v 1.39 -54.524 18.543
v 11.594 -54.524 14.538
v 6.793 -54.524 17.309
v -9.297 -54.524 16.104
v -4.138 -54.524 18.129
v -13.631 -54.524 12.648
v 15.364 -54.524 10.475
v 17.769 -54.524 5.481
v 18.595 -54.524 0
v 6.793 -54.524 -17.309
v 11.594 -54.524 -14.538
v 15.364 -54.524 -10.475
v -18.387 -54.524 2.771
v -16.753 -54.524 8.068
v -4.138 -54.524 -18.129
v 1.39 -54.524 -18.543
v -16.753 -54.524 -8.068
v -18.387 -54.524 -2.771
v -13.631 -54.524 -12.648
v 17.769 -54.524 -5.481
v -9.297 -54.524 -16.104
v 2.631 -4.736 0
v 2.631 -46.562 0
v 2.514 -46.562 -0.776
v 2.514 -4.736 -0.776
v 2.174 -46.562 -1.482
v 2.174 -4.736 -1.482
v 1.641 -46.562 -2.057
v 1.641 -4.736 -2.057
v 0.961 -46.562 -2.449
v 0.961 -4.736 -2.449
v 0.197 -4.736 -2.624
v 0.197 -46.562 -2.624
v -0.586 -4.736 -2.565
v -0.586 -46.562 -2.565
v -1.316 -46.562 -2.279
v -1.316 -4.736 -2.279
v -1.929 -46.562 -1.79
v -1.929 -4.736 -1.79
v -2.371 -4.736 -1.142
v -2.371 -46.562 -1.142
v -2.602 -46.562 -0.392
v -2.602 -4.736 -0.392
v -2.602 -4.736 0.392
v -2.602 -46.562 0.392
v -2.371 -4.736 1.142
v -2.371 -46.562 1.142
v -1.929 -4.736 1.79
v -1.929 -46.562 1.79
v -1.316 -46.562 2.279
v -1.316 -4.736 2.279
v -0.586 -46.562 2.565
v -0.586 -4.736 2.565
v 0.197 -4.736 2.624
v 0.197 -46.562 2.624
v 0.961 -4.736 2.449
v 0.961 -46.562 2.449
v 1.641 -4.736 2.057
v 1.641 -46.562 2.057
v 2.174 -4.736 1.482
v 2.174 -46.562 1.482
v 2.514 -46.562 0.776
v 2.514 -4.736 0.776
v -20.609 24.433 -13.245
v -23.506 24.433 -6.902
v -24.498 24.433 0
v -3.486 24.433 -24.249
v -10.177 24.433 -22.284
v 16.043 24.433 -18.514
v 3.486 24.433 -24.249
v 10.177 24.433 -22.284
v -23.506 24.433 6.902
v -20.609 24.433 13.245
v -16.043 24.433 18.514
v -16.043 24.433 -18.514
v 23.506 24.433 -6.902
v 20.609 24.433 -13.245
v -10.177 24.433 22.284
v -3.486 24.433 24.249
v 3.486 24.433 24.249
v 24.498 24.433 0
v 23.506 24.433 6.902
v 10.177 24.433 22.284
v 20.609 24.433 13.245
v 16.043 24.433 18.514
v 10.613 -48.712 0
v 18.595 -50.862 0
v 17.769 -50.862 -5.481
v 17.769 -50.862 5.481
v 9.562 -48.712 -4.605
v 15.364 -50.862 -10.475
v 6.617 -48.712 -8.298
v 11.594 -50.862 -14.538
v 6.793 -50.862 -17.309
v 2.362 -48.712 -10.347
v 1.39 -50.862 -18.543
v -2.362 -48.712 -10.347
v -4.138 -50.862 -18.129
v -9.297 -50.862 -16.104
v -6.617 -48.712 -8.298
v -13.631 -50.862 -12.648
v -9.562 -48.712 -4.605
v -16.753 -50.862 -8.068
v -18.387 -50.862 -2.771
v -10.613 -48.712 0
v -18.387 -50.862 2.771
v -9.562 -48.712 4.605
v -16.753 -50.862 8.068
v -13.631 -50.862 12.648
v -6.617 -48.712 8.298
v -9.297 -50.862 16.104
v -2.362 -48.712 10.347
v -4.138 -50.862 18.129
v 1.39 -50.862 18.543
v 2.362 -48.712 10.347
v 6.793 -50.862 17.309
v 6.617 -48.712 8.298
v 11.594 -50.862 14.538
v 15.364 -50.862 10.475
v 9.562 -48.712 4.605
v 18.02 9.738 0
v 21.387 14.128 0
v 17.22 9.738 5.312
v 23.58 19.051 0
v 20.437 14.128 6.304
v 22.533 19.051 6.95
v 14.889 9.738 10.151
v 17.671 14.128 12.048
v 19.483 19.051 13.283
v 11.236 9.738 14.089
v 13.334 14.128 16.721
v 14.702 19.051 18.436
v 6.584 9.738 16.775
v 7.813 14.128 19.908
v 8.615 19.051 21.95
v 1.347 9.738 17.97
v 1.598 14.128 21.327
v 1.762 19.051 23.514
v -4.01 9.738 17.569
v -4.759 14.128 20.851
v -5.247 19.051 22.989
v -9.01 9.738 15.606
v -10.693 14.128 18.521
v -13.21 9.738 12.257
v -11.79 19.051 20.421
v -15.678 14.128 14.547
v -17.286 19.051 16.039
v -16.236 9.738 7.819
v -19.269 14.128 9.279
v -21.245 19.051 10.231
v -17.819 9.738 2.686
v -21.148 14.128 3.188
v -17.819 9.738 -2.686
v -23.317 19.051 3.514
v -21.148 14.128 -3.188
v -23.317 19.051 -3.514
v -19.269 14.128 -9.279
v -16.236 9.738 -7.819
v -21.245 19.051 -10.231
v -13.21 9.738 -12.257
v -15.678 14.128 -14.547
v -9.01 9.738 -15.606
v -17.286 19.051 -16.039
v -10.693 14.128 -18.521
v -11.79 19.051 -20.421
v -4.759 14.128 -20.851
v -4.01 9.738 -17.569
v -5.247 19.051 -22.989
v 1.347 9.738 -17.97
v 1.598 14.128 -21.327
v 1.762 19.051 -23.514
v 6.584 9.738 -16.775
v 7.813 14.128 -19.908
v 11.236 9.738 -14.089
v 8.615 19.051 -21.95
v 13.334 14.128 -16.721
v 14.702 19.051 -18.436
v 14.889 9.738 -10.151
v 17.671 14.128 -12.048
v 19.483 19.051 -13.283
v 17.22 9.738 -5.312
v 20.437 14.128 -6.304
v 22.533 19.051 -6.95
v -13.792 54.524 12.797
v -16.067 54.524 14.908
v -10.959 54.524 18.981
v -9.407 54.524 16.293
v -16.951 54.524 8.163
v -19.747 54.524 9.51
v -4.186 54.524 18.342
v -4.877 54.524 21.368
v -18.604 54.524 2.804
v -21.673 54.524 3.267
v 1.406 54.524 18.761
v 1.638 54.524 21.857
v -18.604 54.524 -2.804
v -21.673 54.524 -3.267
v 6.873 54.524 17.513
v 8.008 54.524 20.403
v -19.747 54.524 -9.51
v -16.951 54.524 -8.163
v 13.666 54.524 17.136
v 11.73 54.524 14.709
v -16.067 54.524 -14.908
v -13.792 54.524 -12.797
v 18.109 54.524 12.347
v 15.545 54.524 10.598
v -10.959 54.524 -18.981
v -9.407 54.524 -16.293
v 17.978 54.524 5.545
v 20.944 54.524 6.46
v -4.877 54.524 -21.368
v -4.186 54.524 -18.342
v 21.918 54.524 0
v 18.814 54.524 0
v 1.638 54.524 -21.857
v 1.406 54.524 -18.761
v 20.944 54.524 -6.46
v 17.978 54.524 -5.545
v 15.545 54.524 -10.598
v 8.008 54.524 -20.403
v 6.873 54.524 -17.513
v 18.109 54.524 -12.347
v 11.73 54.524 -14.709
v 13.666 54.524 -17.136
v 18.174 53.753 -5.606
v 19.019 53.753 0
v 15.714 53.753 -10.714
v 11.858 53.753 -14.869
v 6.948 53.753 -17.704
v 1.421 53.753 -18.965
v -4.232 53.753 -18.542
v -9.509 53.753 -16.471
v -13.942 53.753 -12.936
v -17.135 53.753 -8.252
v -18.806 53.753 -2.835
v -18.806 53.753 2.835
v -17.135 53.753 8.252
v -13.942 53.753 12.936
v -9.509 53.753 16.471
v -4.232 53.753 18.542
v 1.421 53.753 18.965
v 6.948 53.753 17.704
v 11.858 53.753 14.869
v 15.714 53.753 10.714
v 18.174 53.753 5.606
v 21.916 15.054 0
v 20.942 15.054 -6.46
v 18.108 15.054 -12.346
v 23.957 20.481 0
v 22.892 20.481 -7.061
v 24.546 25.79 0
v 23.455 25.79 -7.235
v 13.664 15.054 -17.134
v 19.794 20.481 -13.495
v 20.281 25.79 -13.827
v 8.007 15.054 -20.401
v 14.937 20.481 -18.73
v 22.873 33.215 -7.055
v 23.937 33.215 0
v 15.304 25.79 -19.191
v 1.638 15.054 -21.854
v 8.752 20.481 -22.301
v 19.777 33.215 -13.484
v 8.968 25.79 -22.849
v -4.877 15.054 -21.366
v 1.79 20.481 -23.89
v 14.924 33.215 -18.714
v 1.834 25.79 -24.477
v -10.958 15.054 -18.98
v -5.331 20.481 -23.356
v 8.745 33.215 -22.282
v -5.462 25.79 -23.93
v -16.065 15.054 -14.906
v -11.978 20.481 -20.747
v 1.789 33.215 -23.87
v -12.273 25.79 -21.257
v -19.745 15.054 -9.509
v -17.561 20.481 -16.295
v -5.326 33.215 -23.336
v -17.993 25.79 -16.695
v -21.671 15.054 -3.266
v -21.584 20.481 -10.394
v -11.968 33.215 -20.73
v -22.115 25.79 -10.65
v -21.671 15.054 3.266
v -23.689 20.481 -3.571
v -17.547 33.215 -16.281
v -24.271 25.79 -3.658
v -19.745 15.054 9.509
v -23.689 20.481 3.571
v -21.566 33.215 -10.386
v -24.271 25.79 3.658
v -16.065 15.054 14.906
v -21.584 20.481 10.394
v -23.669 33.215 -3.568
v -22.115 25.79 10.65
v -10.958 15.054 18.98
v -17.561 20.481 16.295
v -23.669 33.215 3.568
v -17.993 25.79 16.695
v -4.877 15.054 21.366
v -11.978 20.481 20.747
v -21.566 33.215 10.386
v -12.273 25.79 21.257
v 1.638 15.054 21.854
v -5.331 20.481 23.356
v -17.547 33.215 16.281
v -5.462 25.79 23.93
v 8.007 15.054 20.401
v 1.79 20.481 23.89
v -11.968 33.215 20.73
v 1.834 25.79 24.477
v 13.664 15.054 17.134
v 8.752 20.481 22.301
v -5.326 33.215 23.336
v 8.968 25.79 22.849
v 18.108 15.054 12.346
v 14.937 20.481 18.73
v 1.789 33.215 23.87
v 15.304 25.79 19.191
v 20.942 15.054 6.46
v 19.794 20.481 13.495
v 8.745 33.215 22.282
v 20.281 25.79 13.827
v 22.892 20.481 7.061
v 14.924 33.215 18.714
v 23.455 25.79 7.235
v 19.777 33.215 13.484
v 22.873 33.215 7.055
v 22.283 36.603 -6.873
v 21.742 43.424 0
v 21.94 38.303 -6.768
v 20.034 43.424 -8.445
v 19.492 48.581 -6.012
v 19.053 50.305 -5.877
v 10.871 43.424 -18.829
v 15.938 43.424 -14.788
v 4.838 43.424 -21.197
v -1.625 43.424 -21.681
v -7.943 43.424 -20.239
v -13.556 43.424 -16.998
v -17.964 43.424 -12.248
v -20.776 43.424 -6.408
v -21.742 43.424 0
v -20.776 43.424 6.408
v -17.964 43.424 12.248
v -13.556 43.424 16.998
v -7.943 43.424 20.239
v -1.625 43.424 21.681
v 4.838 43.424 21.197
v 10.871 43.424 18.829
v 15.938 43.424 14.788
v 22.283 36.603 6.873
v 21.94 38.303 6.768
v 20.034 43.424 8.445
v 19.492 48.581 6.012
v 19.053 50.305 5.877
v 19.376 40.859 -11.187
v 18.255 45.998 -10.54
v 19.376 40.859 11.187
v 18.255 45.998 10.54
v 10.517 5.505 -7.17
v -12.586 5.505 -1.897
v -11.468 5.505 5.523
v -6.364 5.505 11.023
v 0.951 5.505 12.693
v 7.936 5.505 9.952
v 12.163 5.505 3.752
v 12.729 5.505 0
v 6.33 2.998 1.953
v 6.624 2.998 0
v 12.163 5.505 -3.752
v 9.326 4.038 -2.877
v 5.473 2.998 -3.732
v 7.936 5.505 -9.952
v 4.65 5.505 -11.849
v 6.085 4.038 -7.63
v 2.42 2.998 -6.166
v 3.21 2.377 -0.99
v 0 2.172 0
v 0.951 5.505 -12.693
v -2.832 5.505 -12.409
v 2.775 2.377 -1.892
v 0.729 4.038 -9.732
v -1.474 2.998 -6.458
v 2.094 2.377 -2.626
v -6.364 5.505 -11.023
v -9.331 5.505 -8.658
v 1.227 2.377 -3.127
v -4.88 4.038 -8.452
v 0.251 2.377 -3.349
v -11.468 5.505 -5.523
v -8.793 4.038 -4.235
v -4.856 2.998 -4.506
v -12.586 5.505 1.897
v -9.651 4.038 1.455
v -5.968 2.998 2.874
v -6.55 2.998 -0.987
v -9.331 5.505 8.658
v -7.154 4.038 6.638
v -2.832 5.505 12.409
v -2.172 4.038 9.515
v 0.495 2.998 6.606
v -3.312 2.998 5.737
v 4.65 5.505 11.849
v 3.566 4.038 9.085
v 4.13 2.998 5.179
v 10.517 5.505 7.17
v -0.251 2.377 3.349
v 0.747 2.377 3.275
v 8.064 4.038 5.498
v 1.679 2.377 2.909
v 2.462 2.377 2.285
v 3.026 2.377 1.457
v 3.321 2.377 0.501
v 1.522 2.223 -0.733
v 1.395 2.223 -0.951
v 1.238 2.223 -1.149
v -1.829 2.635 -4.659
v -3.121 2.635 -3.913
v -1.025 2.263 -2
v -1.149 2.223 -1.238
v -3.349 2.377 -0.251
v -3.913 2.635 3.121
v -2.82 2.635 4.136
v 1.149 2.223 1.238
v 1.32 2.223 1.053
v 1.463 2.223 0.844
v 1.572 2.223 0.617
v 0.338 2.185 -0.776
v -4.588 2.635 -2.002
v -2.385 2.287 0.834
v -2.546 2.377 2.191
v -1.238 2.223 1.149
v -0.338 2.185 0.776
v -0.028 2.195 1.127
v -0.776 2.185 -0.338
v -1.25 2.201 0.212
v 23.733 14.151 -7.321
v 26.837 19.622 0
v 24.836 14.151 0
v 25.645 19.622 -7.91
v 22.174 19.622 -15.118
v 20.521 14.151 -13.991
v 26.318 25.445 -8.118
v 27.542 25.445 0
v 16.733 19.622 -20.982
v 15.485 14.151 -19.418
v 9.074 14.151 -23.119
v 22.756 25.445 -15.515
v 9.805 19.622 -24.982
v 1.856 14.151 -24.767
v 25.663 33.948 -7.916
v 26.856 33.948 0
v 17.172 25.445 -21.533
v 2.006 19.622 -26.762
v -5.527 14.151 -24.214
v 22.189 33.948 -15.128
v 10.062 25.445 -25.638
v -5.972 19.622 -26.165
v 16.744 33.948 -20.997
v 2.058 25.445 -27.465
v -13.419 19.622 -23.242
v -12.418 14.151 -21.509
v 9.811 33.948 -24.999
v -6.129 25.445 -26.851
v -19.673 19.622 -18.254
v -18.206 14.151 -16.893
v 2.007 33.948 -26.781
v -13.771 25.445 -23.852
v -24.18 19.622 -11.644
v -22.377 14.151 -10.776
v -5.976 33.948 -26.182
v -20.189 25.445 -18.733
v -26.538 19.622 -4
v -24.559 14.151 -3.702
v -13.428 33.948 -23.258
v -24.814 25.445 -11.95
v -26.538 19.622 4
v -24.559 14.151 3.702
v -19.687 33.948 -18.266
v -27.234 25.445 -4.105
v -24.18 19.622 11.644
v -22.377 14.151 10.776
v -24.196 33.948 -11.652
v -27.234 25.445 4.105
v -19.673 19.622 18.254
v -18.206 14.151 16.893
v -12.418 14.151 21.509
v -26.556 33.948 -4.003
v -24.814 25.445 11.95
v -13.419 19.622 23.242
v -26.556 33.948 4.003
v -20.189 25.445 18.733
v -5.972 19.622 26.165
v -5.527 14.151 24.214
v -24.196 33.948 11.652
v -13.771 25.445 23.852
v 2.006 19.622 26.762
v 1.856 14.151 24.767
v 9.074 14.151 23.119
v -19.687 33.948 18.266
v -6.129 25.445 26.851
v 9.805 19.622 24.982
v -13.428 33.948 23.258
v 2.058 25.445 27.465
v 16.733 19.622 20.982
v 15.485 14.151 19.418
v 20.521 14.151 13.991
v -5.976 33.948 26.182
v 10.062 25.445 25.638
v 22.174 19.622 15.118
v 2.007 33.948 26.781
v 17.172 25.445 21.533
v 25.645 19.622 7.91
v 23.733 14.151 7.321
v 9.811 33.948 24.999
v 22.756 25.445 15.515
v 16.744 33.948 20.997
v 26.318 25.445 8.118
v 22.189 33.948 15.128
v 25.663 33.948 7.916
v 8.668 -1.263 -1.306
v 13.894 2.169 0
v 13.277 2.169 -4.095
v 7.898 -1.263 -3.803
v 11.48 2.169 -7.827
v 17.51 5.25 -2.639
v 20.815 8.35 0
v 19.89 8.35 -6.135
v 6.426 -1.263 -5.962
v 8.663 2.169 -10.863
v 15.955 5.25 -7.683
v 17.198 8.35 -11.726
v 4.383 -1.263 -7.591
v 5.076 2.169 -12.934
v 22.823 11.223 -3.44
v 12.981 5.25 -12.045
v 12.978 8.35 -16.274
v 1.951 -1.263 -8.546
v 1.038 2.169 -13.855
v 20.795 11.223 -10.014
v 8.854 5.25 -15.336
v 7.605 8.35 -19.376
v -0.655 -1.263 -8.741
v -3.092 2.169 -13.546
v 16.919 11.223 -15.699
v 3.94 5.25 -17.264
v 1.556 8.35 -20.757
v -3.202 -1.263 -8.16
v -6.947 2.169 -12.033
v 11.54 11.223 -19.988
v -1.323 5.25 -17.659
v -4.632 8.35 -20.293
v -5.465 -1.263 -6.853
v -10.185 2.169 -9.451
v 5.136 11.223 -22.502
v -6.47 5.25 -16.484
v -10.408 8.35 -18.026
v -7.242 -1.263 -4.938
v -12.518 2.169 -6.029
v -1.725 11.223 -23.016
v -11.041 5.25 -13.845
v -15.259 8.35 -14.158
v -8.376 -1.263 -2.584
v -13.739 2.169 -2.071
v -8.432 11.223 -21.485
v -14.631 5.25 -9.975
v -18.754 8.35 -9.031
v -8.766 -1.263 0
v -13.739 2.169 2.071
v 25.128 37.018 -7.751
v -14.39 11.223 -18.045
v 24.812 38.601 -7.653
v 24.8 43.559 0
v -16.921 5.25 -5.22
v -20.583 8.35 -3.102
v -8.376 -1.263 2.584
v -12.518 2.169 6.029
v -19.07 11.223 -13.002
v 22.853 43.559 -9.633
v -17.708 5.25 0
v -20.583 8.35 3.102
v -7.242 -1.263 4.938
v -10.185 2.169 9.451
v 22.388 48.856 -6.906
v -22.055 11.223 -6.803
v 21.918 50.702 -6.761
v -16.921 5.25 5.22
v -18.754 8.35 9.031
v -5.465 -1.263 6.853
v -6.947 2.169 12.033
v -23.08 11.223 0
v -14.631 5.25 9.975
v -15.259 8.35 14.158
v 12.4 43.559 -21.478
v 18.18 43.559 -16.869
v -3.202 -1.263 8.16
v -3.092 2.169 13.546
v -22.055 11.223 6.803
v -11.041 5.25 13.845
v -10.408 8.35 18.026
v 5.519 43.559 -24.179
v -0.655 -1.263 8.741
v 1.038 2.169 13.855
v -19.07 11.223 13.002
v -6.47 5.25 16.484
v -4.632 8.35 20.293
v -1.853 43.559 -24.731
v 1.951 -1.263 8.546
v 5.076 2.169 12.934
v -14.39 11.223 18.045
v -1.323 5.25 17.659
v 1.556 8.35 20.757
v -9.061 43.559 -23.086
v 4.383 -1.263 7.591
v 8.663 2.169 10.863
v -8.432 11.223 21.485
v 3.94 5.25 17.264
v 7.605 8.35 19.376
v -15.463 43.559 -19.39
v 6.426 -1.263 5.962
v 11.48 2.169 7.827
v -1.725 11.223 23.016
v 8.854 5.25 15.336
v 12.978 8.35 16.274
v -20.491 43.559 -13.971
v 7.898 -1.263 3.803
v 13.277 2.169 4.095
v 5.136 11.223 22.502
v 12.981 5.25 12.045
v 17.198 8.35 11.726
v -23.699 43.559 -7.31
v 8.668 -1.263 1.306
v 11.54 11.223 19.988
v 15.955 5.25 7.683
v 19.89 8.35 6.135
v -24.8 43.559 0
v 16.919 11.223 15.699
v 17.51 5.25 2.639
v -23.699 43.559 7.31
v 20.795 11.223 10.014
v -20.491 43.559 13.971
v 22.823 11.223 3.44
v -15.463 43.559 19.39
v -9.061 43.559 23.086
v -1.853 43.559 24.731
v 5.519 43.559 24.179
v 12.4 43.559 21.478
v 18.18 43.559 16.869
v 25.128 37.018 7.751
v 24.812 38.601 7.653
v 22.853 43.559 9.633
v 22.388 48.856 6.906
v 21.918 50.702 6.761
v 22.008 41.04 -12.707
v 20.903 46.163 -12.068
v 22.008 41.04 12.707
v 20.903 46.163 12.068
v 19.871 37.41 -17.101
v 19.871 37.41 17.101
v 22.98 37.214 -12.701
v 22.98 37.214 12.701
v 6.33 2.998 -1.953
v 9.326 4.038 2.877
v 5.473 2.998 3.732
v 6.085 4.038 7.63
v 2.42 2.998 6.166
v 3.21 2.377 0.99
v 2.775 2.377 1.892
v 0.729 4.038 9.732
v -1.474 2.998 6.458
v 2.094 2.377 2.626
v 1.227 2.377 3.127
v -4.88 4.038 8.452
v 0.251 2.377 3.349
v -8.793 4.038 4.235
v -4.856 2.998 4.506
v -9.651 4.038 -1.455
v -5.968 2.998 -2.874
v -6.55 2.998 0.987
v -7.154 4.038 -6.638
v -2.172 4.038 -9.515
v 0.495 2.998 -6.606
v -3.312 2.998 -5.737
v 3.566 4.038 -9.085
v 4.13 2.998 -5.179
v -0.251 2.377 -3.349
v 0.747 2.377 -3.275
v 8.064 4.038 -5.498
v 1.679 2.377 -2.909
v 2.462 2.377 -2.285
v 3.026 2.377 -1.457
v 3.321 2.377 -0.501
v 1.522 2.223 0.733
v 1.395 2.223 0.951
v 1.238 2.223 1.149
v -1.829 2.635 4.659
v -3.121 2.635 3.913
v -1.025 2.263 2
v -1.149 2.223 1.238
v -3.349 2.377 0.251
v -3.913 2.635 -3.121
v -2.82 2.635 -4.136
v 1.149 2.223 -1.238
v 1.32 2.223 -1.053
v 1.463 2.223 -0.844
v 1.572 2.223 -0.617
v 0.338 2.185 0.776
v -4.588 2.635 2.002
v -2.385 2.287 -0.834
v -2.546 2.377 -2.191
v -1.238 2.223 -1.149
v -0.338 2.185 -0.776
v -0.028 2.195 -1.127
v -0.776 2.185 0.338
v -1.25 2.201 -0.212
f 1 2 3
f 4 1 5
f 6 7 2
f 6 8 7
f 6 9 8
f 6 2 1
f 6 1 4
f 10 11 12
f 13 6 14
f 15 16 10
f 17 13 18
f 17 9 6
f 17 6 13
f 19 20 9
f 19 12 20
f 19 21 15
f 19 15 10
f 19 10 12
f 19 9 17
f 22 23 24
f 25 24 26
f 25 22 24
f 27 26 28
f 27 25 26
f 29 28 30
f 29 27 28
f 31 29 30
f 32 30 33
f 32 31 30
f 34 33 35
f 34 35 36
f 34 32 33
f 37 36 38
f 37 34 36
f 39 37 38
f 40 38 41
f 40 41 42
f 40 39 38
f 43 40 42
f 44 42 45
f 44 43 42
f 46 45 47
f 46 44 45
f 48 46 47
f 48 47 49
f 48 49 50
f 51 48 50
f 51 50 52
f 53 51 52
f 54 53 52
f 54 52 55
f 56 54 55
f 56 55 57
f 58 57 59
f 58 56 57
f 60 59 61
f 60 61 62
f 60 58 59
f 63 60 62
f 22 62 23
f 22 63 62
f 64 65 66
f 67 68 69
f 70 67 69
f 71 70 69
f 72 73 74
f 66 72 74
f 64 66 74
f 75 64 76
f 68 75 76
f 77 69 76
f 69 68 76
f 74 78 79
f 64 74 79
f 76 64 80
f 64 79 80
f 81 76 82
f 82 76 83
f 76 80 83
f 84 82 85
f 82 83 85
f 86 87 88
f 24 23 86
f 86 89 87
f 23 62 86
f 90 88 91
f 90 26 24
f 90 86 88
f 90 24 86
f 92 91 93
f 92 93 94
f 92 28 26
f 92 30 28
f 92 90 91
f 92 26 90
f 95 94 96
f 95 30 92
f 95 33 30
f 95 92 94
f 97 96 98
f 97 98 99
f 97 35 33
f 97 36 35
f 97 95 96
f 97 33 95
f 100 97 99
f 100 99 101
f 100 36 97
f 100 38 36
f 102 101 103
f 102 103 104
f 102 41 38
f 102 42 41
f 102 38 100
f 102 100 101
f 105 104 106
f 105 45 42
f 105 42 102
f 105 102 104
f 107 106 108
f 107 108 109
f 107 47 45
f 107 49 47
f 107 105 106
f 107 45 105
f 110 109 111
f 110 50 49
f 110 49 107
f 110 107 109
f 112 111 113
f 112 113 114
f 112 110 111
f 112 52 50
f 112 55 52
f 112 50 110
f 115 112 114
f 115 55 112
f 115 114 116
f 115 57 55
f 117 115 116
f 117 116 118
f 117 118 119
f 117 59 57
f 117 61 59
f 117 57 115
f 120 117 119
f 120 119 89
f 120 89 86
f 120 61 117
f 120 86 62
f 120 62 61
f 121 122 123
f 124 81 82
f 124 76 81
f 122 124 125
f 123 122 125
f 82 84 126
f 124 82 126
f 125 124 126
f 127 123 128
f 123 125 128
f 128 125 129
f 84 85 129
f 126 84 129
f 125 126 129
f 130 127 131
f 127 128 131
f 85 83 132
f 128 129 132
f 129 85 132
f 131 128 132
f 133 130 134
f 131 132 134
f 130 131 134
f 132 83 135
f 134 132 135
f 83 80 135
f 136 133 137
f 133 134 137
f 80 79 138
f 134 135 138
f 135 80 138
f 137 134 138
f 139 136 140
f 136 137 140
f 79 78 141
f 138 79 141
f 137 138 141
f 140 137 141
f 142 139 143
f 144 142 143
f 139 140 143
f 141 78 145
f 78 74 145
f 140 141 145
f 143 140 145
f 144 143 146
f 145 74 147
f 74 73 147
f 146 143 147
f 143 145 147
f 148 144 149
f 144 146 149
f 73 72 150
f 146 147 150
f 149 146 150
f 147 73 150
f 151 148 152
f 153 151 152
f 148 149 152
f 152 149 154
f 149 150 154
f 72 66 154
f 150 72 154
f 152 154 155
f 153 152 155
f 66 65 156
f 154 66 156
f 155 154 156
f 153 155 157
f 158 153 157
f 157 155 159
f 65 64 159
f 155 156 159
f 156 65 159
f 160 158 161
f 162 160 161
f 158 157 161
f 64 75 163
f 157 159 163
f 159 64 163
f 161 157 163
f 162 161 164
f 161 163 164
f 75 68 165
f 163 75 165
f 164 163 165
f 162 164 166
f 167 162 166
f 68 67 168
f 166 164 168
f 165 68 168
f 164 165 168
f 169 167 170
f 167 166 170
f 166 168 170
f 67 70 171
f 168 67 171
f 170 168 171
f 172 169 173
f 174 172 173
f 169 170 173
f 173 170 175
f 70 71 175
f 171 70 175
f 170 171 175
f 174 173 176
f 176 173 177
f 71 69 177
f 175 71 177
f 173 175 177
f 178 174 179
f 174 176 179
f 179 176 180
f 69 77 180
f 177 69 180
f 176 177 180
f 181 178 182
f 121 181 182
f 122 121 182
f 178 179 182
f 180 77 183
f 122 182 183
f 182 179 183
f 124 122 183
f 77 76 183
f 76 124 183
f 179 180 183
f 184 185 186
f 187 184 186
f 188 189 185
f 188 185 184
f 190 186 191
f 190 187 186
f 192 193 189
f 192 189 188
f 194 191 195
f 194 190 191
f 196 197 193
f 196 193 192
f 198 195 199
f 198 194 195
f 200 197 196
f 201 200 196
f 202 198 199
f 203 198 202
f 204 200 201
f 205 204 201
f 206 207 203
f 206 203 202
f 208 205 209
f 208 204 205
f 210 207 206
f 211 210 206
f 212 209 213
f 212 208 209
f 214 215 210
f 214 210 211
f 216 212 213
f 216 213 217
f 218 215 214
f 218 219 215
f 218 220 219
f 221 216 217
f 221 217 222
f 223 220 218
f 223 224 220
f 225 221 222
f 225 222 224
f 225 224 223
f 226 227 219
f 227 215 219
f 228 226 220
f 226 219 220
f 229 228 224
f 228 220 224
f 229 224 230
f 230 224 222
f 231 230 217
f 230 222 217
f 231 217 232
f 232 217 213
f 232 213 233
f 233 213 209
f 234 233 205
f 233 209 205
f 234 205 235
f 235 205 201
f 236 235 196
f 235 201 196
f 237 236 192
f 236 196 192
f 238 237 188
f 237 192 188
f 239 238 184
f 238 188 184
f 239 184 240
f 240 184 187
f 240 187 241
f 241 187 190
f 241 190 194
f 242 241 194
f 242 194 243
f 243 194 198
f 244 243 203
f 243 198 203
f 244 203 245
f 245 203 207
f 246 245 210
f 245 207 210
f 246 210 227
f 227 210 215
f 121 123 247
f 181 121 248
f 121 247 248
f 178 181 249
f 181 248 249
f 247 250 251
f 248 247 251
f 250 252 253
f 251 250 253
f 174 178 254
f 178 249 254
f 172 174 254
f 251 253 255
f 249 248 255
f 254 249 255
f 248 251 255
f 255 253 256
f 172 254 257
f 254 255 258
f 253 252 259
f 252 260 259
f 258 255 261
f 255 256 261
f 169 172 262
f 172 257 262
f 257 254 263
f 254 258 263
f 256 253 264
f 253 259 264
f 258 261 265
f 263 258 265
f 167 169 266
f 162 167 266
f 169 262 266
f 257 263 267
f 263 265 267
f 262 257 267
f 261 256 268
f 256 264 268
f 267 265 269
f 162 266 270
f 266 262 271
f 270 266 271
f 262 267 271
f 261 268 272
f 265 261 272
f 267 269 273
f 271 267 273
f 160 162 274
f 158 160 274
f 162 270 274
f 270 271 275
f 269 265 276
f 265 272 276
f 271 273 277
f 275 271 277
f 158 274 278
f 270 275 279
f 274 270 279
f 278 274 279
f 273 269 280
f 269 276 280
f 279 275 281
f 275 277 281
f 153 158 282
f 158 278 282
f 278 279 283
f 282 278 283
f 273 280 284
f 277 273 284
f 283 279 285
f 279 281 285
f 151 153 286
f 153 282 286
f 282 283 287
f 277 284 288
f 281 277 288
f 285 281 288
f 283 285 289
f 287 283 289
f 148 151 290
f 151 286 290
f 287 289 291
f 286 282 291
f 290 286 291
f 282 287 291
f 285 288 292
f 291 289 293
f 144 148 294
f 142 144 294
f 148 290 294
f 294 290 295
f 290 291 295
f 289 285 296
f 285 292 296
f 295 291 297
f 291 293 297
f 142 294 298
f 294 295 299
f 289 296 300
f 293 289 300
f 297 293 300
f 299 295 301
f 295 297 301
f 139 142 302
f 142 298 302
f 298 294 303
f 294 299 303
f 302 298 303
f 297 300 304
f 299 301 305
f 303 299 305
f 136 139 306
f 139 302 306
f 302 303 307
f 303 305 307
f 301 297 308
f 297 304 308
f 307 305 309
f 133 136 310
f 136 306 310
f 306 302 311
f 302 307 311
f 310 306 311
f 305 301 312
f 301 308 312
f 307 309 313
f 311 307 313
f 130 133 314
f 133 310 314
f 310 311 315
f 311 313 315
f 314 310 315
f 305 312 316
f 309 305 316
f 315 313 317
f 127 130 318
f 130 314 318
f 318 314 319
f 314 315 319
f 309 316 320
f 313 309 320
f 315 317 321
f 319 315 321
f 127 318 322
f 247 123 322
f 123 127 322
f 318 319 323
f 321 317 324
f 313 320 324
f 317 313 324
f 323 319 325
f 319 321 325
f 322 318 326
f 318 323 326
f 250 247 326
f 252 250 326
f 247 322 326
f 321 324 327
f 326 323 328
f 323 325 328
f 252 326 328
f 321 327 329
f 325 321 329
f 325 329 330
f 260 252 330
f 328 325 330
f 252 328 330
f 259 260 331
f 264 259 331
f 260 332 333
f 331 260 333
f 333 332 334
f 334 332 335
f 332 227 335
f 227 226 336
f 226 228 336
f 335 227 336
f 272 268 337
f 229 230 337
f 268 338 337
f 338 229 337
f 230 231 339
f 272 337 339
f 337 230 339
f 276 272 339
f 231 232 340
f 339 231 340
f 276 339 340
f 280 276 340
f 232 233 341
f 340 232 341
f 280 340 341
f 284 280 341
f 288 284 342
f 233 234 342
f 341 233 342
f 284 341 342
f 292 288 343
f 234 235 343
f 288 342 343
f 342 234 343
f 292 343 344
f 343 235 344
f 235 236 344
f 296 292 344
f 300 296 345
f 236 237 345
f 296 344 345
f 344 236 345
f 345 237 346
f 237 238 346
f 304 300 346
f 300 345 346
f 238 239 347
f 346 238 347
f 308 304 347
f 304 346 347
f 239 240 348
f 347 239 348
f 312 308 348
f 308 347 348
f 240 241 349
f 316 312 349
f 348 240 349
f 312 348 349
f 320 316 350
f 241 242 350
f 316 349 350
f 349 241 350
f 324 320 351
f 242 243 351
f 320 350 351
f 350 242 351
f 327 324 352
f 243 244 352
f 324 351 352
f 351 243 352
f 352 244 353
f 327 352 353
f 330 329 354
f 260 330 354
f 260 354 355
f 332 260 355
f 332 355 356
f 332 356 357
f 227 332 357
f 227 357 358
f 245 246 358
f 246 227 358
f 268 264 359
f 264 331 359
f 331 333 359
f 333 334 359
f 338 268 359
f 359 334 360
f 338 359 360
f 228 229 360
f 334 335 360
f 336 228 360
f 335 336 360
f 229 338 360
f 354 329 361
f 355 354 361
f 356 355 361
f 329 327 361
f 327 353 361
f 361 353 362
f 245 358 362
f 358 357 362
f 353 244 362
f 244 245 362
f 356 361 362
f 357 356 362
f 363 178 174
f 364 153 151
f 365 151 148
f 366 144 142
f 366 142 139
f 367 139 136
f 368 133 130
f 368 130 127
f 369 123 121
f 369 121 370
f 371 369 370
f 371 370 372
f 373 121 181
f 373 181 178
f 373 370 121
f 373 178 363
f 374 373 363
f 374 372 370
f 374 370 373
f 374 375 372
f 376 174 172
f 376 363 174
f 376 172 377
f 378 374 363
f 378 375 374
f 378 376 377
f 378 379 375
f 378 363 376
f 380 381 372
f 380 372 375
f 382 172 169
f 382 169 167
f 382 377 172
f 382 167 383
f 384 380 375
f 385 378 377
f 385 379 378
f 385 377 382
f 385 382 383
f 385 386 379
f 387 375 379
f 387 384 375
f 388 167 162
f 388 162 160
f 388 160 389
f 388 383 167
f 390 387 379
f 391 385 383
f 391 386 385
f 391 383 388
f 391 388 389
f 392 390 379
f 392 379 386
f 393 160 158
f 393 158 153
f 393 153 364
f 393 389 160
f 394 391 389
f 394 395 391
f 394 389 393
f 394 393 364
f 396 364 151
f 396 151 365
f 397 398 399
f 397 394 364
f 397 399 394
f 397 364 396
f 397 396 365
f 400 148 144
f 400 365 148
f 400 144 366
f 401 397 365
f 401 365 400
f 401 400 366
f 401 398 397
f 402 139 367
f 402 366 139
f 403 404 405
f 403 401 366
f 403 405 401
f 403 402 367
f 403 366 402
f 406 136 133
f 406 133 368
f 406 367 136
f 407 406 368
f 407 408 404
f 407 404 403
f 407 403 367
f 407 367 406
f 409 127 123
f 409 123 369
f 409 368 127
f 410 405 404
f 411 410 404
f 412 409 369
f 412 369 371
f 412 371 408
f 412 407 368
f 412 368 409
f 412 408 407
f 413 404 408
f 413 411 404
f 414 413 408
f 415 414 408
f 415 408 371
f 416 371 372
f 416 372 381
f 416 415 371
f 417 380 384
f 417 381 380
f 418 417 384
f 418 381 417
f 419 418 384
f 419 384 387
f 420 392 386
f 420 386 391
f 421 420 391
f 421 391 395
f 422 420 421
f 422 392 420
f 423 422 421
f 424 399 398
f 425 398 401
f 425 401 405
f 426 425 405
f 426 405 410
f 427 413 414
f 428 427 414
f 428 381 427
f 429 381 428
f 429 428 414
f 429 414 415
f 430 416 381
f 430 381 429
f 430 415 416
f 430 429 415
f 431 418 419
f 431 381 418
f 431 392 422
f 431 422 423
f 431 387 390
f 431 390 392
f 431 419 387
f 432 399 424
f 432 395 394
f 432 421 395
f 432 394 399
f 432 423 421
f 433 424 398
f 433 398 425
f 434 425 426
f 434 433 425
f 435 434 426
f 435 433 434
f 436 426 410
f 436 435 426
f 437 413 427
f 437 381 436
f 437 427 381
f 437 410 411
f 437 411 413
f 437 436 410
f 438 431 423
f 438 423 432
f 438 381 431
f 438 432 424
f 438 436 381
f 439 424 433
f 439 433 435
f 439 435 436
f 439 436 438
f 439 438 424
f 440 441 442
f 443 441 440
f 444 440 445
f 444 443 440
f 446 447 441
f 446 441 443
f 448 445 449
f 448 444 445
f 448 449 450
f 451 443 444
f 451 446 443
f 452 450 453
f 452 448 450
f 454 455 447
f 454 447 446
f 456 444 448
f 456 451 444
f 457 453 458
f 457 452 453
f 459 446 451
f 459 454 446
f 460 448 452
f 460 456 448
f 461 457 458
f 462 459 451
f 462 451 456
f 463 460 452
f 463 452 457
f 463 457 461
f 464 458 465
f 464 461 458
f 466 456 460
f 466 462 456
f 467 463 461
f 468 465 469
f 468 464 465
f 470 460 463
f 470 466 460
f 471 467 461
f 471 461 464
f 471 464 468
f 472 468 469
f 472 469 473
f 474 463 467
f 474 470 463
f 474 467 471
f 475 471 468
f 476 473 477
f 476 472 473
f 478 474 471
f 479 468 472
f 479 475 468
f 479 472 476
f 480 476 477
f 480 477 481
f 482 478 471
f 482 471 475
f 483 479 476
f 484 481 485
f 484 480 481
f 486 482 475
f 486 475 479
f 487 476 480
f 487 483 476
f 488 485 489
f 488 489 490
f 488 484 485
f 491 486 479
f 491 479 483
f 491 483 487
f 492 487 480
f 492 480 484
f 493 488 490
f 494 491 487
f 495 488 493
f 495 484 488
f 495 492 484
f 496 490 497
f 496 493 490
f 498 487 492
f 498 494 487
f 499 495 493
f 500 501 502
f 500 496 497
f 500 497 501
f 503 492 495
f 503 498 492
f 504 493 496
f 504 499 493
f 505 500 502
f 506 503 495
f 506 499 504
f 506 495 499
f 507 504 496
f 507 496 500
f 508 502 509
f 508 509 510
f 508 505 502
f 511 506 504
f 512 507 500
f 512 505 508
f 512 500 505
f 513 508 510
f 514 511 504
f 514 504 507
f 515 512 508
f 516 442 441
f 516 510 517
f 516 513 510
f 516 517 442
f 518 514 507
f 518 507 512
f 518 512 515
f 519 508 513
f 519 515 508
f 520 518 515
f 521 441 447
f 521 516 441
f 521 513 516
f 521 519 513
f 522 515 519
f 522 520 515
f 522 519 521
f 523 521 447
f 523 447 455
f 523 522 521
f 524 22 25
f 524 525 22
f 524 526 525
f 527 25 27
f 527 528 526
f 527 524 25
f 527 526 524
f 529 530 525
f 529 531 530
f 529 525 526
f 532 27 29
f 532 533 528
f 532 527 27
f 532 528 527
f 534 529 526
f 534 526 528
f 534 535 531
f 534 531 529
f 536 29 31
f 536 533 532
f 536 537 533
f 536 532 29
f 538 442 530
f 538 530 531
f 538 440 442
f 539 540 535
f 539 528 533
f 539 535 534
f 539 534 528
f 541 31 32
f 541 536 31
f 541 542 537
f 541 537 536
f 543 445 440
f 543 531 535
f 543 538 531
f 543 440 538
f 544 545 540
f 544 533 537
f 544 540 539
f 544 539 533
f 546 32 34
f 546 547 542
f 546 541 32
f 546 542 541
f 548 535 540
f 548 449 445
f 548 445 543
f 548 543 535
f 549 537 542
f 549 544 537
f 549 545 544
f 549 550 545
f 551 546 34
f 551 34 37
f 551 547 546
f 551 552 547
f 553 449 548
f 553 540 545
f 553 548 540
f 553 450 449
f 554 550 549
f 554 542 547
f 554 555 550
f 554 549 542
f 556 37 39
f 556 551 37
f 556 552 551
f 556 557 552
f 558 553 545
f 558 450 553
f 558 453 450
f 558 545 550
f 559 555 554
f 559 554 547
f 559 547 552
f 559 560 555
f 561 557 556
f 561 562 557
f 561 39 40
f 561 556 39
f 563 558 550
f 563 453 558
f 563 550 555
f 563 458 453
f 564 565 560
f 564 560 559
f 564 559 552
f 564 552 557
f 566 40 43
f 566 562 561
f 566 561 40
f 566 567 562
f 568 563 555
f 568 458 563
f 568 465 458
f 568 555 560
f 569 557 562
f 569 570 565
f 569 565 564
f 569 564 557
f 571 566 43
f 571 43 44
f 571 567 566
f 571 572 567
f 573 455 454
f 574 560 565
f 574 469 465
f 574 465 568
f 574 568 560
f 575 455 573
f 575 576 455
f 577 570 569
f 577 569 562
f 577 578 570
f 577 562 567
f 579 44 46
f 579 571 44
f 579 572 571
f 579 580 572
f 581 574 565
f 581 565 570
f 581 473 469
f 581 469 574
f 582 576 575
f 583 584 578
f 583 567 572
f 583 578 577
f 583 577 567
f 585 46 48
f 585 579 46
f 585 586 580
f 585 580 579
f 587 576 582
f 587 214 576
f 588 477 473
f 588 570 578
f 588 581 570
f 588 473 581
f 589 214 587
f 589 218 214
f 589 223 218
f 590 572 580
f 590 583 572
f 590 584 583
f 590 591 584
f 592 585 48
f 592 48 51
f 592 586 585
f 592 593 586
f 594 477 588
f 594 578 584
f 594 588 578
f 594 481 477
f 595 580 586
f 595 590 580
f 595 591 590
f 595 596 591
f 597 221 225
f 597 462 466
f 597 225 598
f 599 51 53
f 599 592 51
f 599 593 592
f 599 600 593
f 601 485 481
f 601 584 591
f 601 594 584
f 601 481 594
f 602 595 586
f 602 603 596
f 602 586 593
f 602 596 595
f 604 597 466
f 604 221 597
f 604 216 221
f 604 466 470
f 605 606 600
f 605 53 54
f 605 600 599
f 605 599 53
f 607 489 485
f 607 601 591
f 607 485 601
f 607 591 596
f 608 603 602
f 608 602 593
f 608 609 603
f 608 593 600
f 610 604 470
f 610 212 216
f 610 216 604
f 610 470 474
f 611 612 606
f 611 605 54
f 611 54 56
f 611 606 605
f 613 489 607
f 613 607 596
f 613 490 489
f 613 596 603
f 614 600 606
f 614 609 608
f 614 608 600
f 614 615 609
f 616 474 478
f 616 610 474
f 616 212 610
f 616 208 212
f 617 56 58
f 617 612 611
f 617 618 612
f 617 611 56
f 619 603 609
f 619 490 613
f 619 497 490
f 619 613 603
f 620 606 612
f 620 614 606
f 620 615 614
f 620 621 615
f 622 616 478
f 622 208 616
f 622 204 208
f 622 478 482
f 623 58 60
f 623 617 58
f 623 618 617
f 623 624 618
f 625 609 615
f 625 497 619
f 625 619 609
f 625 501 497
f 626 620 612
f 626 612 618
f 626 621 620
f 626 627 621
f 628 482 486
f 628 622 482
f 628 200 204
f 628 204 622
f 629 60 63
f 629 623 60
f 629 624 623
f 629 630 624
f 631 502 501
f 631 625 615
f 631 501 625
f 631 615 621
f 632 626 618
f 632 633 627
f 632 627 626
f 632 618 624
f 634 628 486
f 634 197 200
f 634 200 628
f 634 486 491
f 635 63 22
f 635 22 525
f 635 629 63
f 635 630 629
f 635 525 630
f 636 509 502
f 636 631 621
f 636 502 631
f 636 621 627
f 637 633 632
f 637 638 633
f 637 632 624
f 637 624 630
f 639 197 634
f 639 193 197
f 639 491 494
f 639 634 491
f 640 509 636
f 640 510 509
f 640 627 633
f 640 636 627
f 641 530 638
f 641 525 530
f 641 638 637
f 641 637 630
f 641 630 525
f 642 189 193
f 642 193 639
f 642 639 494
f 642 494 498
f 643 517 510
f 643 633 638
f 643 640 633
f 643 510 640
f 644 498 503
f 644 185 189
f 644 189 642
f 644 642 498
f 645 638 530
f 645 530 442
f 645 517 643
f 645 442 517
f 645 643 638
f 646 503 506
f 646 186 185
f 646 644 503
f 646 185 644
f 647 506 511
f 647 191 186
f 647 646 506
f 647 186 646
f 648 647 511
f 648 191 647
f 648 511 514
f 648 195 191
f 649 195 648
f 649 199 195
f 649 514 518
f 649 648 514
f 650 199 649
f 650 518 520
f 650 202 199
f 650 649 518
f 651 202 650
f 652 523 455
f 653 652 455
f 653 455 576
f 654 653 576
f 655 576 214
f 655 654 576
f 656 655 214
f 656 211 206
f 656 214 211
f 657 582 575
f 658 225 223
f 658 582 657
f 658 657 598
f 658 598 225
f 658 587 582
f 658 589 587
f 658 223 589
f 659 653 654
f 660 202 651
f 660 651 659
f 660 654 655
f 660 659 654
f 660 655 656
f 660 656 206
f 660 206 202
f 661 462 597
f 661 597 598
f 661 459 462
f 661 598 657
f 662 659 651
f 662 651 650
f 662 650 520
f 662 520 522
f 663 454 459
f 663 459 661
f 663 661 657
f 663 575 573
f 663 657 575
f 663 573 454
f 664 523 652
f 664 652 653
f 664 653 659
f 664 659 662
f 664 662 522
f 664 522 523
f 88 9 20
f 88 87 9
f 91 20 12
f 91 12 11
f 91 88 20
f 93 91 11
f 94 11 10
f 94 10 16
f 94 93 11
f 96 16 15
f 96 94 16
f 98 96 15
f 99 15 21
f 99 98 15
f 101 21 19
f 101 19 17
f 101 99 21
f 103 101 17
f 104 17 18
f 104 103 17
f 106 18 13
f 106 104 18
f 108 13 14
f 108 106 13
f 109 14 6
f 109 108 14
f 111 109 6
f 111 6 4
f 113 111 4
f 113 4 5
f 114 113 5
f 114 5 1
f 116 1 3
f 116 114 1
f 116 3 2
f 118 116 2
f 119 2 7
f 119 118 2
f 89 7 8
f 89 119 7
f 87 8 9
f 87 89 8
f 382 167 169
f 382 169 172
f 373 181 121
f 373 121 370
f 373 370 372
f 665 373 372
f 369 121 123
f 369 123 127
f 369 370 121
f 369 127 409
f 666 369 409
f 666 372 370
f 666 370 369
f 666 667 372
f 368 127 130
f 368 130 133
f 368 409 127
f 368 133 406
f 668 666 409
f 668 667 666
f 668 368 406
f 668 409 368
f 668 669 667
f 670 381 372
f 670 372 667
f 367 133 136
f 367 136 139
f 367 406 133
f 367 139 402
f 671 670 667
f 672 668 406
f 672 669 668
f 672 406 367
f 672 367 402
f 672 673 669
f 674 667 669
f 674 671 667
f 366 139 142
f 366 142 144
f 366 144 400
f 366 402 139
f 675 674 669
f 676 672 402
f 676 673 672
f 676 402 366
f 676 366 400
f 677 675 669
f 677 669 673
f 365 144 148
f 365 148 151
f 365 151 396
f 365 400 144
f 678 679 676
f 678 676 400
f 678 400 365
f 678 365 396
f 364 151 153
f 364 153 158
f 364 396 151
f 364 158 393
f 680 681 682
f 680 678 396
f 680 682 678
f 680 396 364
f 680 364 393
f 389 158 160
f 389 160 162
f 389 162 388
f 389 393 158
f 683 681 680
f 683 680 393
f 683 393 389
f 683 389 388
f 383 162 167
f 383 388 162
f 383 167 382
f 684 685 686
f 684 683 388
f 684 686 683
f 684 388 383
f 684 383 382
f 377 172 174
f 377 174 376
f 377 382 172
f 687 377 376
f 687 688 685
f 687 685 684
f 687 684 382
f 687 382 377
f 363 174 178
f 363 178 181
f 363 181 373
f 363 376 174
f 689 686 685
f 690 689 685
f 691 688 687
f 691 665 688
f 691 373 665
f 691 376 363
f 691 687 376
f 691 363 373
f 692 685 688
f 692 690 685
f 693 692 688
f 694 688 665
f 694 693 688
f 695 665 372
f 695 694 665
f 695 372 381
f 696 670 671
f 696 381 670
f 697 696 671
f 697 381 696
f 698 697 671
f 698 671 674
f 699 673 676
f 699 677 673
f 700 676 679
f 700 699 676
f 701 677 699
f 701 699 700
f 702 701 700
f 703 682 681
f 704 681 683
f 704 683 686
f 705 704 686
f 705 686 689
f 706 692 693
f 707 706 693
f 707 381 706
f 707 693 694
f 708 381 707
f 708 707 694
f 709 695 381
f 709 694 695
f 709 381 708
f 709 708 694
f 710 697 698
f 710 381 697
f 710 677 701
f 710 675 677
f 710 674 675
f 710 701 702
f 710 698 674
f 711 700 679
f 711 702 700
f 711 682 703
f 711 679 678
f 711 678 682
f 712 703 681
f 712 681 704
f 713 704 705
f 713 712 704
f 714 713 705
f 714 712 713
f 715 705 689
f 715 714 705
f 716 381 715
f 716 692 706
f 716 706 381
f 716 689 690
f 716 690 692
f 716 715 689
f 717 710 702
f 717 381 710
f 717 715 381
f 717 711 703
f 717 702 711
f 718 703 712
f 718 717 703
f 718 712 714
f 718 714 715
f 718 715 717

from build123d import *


# Read off the part's stored shape, not the designer's step: Cut-Revolve1
with BuildPart() as part:
    # Sketch2 → Revolve1 (revolve)
    with BuildSketch(Plane.XY):
        with BuildLine():
            Line((2.631253823, -46.562458286), (2.631253823, -4.736256881))
            add(Edge.make_bspline(
                [(2.631253823, -4.736256881), (34.471117499, 12.018970529), (29.443053516, 26.193716055), (21.917928882, 54.523597031)],
                knots=[0, 0, 0, 0, 1, 1, 1, 1], degree=3))
            Line((21.917928882, 54.523597031), (0, 54.523597031))
            Line((0, 54.523597031), (0, -54.523597031))
            Line((0, -54.523597031), (18.594871216, -54.523597031))
            Line((18.594871216, -54.523597031), (18.594871216, -50.861683976))
            Line((18.594871216, -50.861683976), (2.631253823, -46.562458286))
        make_face()
    revolve(axis=Axis((0, -54.523597031, 0), (0, 1, 0)))

    # Cut-Revolve1 outline → Cut-Revolve1 (revolve, cut)
    with BuildSketch(Plane.XY):
        with BuildLine():
            add(Edge.make_bspline(
                [(18.020471145, 9.738037596), (13.232269499, 4.62684716), (6.786495281, 2.171739839), (0, 2.171739839)],
                knots=[0.001429836, 0.001429836, 0.001429836, 0.001429836, 1, 1, 1, 1], degree=3))
            add(Edge.make_bspline(
                [(18.020471145, 9.738037596), (18.490068509, 10.239614321), (19.492455887, 11.381389394), (21.969134176, 14.711204078), (24.39185026, 20.213899803), (24.772115374, 28.28587885), (23.422813446, 36.692884797), (21.327912764, 45.171242003), (19.776816311, 50.899250576), (19.018524326, 53.75323788)],
                knots=[0.304443695, 0.304443695, 0.304443695, 0.304443695, 0.336156678, 0.375, 0.5, 0.625, 0.75, 0.875, 1, 1, 1, 1], degree=3))
            Line((19.018524326, 53.75323788), (18.813843258, 54.523597031))
            Line((18.813843258, 54.523597031), (0, 54.523597031))
            Line((0, 54.523597031), (0, 2.171739839))
        make_face()
    revolve(axis=Axis((0, 0, 0), (0, 1, 0)), mode=Mode.SUBTRACT)


with BuildPart() as body_2:
    # Sketch5 → Revolve2 (revolve)
    with BuildSketch(Plane.XY):
        with BuildLine():
            Line((24.49790326, 24.433071211), (0, 24.433071211))
            Line((0, 24.433071211), (0, 2.171739839))
            add(Edge.make_bspline(
                [(18.02047452, 9.738034434), (13.232271308, 4.626844539), (6.786495937, 2.171738373), (0, 2.171739839)],
                knots=[0, 0, 0, 0, 1, 1, 1, 1], degree=3))
            add(Edge.make_bspline(
                [(18.02047452, 9.738034434), (18.490068509, 10.239614321), (19.492455887, 11.381389394), (21.969134176, 14.711204078), (23.888170898, 19.069896885), (24.417216372, 23.045719749), (24.49790326, 24.433071211)],
                knots=[0, 0, 0, 0, 0.045593697, 0.101438668, 0.281150935, 0.374529239, 0.374529239, 0.374529239, 0.374529239], degree=3))
        make_face()
    revolve(axis=Axis((0, 24.433071211, 0), (0, -1, 0)))


solid = Compound([part.part, body_2.part])
